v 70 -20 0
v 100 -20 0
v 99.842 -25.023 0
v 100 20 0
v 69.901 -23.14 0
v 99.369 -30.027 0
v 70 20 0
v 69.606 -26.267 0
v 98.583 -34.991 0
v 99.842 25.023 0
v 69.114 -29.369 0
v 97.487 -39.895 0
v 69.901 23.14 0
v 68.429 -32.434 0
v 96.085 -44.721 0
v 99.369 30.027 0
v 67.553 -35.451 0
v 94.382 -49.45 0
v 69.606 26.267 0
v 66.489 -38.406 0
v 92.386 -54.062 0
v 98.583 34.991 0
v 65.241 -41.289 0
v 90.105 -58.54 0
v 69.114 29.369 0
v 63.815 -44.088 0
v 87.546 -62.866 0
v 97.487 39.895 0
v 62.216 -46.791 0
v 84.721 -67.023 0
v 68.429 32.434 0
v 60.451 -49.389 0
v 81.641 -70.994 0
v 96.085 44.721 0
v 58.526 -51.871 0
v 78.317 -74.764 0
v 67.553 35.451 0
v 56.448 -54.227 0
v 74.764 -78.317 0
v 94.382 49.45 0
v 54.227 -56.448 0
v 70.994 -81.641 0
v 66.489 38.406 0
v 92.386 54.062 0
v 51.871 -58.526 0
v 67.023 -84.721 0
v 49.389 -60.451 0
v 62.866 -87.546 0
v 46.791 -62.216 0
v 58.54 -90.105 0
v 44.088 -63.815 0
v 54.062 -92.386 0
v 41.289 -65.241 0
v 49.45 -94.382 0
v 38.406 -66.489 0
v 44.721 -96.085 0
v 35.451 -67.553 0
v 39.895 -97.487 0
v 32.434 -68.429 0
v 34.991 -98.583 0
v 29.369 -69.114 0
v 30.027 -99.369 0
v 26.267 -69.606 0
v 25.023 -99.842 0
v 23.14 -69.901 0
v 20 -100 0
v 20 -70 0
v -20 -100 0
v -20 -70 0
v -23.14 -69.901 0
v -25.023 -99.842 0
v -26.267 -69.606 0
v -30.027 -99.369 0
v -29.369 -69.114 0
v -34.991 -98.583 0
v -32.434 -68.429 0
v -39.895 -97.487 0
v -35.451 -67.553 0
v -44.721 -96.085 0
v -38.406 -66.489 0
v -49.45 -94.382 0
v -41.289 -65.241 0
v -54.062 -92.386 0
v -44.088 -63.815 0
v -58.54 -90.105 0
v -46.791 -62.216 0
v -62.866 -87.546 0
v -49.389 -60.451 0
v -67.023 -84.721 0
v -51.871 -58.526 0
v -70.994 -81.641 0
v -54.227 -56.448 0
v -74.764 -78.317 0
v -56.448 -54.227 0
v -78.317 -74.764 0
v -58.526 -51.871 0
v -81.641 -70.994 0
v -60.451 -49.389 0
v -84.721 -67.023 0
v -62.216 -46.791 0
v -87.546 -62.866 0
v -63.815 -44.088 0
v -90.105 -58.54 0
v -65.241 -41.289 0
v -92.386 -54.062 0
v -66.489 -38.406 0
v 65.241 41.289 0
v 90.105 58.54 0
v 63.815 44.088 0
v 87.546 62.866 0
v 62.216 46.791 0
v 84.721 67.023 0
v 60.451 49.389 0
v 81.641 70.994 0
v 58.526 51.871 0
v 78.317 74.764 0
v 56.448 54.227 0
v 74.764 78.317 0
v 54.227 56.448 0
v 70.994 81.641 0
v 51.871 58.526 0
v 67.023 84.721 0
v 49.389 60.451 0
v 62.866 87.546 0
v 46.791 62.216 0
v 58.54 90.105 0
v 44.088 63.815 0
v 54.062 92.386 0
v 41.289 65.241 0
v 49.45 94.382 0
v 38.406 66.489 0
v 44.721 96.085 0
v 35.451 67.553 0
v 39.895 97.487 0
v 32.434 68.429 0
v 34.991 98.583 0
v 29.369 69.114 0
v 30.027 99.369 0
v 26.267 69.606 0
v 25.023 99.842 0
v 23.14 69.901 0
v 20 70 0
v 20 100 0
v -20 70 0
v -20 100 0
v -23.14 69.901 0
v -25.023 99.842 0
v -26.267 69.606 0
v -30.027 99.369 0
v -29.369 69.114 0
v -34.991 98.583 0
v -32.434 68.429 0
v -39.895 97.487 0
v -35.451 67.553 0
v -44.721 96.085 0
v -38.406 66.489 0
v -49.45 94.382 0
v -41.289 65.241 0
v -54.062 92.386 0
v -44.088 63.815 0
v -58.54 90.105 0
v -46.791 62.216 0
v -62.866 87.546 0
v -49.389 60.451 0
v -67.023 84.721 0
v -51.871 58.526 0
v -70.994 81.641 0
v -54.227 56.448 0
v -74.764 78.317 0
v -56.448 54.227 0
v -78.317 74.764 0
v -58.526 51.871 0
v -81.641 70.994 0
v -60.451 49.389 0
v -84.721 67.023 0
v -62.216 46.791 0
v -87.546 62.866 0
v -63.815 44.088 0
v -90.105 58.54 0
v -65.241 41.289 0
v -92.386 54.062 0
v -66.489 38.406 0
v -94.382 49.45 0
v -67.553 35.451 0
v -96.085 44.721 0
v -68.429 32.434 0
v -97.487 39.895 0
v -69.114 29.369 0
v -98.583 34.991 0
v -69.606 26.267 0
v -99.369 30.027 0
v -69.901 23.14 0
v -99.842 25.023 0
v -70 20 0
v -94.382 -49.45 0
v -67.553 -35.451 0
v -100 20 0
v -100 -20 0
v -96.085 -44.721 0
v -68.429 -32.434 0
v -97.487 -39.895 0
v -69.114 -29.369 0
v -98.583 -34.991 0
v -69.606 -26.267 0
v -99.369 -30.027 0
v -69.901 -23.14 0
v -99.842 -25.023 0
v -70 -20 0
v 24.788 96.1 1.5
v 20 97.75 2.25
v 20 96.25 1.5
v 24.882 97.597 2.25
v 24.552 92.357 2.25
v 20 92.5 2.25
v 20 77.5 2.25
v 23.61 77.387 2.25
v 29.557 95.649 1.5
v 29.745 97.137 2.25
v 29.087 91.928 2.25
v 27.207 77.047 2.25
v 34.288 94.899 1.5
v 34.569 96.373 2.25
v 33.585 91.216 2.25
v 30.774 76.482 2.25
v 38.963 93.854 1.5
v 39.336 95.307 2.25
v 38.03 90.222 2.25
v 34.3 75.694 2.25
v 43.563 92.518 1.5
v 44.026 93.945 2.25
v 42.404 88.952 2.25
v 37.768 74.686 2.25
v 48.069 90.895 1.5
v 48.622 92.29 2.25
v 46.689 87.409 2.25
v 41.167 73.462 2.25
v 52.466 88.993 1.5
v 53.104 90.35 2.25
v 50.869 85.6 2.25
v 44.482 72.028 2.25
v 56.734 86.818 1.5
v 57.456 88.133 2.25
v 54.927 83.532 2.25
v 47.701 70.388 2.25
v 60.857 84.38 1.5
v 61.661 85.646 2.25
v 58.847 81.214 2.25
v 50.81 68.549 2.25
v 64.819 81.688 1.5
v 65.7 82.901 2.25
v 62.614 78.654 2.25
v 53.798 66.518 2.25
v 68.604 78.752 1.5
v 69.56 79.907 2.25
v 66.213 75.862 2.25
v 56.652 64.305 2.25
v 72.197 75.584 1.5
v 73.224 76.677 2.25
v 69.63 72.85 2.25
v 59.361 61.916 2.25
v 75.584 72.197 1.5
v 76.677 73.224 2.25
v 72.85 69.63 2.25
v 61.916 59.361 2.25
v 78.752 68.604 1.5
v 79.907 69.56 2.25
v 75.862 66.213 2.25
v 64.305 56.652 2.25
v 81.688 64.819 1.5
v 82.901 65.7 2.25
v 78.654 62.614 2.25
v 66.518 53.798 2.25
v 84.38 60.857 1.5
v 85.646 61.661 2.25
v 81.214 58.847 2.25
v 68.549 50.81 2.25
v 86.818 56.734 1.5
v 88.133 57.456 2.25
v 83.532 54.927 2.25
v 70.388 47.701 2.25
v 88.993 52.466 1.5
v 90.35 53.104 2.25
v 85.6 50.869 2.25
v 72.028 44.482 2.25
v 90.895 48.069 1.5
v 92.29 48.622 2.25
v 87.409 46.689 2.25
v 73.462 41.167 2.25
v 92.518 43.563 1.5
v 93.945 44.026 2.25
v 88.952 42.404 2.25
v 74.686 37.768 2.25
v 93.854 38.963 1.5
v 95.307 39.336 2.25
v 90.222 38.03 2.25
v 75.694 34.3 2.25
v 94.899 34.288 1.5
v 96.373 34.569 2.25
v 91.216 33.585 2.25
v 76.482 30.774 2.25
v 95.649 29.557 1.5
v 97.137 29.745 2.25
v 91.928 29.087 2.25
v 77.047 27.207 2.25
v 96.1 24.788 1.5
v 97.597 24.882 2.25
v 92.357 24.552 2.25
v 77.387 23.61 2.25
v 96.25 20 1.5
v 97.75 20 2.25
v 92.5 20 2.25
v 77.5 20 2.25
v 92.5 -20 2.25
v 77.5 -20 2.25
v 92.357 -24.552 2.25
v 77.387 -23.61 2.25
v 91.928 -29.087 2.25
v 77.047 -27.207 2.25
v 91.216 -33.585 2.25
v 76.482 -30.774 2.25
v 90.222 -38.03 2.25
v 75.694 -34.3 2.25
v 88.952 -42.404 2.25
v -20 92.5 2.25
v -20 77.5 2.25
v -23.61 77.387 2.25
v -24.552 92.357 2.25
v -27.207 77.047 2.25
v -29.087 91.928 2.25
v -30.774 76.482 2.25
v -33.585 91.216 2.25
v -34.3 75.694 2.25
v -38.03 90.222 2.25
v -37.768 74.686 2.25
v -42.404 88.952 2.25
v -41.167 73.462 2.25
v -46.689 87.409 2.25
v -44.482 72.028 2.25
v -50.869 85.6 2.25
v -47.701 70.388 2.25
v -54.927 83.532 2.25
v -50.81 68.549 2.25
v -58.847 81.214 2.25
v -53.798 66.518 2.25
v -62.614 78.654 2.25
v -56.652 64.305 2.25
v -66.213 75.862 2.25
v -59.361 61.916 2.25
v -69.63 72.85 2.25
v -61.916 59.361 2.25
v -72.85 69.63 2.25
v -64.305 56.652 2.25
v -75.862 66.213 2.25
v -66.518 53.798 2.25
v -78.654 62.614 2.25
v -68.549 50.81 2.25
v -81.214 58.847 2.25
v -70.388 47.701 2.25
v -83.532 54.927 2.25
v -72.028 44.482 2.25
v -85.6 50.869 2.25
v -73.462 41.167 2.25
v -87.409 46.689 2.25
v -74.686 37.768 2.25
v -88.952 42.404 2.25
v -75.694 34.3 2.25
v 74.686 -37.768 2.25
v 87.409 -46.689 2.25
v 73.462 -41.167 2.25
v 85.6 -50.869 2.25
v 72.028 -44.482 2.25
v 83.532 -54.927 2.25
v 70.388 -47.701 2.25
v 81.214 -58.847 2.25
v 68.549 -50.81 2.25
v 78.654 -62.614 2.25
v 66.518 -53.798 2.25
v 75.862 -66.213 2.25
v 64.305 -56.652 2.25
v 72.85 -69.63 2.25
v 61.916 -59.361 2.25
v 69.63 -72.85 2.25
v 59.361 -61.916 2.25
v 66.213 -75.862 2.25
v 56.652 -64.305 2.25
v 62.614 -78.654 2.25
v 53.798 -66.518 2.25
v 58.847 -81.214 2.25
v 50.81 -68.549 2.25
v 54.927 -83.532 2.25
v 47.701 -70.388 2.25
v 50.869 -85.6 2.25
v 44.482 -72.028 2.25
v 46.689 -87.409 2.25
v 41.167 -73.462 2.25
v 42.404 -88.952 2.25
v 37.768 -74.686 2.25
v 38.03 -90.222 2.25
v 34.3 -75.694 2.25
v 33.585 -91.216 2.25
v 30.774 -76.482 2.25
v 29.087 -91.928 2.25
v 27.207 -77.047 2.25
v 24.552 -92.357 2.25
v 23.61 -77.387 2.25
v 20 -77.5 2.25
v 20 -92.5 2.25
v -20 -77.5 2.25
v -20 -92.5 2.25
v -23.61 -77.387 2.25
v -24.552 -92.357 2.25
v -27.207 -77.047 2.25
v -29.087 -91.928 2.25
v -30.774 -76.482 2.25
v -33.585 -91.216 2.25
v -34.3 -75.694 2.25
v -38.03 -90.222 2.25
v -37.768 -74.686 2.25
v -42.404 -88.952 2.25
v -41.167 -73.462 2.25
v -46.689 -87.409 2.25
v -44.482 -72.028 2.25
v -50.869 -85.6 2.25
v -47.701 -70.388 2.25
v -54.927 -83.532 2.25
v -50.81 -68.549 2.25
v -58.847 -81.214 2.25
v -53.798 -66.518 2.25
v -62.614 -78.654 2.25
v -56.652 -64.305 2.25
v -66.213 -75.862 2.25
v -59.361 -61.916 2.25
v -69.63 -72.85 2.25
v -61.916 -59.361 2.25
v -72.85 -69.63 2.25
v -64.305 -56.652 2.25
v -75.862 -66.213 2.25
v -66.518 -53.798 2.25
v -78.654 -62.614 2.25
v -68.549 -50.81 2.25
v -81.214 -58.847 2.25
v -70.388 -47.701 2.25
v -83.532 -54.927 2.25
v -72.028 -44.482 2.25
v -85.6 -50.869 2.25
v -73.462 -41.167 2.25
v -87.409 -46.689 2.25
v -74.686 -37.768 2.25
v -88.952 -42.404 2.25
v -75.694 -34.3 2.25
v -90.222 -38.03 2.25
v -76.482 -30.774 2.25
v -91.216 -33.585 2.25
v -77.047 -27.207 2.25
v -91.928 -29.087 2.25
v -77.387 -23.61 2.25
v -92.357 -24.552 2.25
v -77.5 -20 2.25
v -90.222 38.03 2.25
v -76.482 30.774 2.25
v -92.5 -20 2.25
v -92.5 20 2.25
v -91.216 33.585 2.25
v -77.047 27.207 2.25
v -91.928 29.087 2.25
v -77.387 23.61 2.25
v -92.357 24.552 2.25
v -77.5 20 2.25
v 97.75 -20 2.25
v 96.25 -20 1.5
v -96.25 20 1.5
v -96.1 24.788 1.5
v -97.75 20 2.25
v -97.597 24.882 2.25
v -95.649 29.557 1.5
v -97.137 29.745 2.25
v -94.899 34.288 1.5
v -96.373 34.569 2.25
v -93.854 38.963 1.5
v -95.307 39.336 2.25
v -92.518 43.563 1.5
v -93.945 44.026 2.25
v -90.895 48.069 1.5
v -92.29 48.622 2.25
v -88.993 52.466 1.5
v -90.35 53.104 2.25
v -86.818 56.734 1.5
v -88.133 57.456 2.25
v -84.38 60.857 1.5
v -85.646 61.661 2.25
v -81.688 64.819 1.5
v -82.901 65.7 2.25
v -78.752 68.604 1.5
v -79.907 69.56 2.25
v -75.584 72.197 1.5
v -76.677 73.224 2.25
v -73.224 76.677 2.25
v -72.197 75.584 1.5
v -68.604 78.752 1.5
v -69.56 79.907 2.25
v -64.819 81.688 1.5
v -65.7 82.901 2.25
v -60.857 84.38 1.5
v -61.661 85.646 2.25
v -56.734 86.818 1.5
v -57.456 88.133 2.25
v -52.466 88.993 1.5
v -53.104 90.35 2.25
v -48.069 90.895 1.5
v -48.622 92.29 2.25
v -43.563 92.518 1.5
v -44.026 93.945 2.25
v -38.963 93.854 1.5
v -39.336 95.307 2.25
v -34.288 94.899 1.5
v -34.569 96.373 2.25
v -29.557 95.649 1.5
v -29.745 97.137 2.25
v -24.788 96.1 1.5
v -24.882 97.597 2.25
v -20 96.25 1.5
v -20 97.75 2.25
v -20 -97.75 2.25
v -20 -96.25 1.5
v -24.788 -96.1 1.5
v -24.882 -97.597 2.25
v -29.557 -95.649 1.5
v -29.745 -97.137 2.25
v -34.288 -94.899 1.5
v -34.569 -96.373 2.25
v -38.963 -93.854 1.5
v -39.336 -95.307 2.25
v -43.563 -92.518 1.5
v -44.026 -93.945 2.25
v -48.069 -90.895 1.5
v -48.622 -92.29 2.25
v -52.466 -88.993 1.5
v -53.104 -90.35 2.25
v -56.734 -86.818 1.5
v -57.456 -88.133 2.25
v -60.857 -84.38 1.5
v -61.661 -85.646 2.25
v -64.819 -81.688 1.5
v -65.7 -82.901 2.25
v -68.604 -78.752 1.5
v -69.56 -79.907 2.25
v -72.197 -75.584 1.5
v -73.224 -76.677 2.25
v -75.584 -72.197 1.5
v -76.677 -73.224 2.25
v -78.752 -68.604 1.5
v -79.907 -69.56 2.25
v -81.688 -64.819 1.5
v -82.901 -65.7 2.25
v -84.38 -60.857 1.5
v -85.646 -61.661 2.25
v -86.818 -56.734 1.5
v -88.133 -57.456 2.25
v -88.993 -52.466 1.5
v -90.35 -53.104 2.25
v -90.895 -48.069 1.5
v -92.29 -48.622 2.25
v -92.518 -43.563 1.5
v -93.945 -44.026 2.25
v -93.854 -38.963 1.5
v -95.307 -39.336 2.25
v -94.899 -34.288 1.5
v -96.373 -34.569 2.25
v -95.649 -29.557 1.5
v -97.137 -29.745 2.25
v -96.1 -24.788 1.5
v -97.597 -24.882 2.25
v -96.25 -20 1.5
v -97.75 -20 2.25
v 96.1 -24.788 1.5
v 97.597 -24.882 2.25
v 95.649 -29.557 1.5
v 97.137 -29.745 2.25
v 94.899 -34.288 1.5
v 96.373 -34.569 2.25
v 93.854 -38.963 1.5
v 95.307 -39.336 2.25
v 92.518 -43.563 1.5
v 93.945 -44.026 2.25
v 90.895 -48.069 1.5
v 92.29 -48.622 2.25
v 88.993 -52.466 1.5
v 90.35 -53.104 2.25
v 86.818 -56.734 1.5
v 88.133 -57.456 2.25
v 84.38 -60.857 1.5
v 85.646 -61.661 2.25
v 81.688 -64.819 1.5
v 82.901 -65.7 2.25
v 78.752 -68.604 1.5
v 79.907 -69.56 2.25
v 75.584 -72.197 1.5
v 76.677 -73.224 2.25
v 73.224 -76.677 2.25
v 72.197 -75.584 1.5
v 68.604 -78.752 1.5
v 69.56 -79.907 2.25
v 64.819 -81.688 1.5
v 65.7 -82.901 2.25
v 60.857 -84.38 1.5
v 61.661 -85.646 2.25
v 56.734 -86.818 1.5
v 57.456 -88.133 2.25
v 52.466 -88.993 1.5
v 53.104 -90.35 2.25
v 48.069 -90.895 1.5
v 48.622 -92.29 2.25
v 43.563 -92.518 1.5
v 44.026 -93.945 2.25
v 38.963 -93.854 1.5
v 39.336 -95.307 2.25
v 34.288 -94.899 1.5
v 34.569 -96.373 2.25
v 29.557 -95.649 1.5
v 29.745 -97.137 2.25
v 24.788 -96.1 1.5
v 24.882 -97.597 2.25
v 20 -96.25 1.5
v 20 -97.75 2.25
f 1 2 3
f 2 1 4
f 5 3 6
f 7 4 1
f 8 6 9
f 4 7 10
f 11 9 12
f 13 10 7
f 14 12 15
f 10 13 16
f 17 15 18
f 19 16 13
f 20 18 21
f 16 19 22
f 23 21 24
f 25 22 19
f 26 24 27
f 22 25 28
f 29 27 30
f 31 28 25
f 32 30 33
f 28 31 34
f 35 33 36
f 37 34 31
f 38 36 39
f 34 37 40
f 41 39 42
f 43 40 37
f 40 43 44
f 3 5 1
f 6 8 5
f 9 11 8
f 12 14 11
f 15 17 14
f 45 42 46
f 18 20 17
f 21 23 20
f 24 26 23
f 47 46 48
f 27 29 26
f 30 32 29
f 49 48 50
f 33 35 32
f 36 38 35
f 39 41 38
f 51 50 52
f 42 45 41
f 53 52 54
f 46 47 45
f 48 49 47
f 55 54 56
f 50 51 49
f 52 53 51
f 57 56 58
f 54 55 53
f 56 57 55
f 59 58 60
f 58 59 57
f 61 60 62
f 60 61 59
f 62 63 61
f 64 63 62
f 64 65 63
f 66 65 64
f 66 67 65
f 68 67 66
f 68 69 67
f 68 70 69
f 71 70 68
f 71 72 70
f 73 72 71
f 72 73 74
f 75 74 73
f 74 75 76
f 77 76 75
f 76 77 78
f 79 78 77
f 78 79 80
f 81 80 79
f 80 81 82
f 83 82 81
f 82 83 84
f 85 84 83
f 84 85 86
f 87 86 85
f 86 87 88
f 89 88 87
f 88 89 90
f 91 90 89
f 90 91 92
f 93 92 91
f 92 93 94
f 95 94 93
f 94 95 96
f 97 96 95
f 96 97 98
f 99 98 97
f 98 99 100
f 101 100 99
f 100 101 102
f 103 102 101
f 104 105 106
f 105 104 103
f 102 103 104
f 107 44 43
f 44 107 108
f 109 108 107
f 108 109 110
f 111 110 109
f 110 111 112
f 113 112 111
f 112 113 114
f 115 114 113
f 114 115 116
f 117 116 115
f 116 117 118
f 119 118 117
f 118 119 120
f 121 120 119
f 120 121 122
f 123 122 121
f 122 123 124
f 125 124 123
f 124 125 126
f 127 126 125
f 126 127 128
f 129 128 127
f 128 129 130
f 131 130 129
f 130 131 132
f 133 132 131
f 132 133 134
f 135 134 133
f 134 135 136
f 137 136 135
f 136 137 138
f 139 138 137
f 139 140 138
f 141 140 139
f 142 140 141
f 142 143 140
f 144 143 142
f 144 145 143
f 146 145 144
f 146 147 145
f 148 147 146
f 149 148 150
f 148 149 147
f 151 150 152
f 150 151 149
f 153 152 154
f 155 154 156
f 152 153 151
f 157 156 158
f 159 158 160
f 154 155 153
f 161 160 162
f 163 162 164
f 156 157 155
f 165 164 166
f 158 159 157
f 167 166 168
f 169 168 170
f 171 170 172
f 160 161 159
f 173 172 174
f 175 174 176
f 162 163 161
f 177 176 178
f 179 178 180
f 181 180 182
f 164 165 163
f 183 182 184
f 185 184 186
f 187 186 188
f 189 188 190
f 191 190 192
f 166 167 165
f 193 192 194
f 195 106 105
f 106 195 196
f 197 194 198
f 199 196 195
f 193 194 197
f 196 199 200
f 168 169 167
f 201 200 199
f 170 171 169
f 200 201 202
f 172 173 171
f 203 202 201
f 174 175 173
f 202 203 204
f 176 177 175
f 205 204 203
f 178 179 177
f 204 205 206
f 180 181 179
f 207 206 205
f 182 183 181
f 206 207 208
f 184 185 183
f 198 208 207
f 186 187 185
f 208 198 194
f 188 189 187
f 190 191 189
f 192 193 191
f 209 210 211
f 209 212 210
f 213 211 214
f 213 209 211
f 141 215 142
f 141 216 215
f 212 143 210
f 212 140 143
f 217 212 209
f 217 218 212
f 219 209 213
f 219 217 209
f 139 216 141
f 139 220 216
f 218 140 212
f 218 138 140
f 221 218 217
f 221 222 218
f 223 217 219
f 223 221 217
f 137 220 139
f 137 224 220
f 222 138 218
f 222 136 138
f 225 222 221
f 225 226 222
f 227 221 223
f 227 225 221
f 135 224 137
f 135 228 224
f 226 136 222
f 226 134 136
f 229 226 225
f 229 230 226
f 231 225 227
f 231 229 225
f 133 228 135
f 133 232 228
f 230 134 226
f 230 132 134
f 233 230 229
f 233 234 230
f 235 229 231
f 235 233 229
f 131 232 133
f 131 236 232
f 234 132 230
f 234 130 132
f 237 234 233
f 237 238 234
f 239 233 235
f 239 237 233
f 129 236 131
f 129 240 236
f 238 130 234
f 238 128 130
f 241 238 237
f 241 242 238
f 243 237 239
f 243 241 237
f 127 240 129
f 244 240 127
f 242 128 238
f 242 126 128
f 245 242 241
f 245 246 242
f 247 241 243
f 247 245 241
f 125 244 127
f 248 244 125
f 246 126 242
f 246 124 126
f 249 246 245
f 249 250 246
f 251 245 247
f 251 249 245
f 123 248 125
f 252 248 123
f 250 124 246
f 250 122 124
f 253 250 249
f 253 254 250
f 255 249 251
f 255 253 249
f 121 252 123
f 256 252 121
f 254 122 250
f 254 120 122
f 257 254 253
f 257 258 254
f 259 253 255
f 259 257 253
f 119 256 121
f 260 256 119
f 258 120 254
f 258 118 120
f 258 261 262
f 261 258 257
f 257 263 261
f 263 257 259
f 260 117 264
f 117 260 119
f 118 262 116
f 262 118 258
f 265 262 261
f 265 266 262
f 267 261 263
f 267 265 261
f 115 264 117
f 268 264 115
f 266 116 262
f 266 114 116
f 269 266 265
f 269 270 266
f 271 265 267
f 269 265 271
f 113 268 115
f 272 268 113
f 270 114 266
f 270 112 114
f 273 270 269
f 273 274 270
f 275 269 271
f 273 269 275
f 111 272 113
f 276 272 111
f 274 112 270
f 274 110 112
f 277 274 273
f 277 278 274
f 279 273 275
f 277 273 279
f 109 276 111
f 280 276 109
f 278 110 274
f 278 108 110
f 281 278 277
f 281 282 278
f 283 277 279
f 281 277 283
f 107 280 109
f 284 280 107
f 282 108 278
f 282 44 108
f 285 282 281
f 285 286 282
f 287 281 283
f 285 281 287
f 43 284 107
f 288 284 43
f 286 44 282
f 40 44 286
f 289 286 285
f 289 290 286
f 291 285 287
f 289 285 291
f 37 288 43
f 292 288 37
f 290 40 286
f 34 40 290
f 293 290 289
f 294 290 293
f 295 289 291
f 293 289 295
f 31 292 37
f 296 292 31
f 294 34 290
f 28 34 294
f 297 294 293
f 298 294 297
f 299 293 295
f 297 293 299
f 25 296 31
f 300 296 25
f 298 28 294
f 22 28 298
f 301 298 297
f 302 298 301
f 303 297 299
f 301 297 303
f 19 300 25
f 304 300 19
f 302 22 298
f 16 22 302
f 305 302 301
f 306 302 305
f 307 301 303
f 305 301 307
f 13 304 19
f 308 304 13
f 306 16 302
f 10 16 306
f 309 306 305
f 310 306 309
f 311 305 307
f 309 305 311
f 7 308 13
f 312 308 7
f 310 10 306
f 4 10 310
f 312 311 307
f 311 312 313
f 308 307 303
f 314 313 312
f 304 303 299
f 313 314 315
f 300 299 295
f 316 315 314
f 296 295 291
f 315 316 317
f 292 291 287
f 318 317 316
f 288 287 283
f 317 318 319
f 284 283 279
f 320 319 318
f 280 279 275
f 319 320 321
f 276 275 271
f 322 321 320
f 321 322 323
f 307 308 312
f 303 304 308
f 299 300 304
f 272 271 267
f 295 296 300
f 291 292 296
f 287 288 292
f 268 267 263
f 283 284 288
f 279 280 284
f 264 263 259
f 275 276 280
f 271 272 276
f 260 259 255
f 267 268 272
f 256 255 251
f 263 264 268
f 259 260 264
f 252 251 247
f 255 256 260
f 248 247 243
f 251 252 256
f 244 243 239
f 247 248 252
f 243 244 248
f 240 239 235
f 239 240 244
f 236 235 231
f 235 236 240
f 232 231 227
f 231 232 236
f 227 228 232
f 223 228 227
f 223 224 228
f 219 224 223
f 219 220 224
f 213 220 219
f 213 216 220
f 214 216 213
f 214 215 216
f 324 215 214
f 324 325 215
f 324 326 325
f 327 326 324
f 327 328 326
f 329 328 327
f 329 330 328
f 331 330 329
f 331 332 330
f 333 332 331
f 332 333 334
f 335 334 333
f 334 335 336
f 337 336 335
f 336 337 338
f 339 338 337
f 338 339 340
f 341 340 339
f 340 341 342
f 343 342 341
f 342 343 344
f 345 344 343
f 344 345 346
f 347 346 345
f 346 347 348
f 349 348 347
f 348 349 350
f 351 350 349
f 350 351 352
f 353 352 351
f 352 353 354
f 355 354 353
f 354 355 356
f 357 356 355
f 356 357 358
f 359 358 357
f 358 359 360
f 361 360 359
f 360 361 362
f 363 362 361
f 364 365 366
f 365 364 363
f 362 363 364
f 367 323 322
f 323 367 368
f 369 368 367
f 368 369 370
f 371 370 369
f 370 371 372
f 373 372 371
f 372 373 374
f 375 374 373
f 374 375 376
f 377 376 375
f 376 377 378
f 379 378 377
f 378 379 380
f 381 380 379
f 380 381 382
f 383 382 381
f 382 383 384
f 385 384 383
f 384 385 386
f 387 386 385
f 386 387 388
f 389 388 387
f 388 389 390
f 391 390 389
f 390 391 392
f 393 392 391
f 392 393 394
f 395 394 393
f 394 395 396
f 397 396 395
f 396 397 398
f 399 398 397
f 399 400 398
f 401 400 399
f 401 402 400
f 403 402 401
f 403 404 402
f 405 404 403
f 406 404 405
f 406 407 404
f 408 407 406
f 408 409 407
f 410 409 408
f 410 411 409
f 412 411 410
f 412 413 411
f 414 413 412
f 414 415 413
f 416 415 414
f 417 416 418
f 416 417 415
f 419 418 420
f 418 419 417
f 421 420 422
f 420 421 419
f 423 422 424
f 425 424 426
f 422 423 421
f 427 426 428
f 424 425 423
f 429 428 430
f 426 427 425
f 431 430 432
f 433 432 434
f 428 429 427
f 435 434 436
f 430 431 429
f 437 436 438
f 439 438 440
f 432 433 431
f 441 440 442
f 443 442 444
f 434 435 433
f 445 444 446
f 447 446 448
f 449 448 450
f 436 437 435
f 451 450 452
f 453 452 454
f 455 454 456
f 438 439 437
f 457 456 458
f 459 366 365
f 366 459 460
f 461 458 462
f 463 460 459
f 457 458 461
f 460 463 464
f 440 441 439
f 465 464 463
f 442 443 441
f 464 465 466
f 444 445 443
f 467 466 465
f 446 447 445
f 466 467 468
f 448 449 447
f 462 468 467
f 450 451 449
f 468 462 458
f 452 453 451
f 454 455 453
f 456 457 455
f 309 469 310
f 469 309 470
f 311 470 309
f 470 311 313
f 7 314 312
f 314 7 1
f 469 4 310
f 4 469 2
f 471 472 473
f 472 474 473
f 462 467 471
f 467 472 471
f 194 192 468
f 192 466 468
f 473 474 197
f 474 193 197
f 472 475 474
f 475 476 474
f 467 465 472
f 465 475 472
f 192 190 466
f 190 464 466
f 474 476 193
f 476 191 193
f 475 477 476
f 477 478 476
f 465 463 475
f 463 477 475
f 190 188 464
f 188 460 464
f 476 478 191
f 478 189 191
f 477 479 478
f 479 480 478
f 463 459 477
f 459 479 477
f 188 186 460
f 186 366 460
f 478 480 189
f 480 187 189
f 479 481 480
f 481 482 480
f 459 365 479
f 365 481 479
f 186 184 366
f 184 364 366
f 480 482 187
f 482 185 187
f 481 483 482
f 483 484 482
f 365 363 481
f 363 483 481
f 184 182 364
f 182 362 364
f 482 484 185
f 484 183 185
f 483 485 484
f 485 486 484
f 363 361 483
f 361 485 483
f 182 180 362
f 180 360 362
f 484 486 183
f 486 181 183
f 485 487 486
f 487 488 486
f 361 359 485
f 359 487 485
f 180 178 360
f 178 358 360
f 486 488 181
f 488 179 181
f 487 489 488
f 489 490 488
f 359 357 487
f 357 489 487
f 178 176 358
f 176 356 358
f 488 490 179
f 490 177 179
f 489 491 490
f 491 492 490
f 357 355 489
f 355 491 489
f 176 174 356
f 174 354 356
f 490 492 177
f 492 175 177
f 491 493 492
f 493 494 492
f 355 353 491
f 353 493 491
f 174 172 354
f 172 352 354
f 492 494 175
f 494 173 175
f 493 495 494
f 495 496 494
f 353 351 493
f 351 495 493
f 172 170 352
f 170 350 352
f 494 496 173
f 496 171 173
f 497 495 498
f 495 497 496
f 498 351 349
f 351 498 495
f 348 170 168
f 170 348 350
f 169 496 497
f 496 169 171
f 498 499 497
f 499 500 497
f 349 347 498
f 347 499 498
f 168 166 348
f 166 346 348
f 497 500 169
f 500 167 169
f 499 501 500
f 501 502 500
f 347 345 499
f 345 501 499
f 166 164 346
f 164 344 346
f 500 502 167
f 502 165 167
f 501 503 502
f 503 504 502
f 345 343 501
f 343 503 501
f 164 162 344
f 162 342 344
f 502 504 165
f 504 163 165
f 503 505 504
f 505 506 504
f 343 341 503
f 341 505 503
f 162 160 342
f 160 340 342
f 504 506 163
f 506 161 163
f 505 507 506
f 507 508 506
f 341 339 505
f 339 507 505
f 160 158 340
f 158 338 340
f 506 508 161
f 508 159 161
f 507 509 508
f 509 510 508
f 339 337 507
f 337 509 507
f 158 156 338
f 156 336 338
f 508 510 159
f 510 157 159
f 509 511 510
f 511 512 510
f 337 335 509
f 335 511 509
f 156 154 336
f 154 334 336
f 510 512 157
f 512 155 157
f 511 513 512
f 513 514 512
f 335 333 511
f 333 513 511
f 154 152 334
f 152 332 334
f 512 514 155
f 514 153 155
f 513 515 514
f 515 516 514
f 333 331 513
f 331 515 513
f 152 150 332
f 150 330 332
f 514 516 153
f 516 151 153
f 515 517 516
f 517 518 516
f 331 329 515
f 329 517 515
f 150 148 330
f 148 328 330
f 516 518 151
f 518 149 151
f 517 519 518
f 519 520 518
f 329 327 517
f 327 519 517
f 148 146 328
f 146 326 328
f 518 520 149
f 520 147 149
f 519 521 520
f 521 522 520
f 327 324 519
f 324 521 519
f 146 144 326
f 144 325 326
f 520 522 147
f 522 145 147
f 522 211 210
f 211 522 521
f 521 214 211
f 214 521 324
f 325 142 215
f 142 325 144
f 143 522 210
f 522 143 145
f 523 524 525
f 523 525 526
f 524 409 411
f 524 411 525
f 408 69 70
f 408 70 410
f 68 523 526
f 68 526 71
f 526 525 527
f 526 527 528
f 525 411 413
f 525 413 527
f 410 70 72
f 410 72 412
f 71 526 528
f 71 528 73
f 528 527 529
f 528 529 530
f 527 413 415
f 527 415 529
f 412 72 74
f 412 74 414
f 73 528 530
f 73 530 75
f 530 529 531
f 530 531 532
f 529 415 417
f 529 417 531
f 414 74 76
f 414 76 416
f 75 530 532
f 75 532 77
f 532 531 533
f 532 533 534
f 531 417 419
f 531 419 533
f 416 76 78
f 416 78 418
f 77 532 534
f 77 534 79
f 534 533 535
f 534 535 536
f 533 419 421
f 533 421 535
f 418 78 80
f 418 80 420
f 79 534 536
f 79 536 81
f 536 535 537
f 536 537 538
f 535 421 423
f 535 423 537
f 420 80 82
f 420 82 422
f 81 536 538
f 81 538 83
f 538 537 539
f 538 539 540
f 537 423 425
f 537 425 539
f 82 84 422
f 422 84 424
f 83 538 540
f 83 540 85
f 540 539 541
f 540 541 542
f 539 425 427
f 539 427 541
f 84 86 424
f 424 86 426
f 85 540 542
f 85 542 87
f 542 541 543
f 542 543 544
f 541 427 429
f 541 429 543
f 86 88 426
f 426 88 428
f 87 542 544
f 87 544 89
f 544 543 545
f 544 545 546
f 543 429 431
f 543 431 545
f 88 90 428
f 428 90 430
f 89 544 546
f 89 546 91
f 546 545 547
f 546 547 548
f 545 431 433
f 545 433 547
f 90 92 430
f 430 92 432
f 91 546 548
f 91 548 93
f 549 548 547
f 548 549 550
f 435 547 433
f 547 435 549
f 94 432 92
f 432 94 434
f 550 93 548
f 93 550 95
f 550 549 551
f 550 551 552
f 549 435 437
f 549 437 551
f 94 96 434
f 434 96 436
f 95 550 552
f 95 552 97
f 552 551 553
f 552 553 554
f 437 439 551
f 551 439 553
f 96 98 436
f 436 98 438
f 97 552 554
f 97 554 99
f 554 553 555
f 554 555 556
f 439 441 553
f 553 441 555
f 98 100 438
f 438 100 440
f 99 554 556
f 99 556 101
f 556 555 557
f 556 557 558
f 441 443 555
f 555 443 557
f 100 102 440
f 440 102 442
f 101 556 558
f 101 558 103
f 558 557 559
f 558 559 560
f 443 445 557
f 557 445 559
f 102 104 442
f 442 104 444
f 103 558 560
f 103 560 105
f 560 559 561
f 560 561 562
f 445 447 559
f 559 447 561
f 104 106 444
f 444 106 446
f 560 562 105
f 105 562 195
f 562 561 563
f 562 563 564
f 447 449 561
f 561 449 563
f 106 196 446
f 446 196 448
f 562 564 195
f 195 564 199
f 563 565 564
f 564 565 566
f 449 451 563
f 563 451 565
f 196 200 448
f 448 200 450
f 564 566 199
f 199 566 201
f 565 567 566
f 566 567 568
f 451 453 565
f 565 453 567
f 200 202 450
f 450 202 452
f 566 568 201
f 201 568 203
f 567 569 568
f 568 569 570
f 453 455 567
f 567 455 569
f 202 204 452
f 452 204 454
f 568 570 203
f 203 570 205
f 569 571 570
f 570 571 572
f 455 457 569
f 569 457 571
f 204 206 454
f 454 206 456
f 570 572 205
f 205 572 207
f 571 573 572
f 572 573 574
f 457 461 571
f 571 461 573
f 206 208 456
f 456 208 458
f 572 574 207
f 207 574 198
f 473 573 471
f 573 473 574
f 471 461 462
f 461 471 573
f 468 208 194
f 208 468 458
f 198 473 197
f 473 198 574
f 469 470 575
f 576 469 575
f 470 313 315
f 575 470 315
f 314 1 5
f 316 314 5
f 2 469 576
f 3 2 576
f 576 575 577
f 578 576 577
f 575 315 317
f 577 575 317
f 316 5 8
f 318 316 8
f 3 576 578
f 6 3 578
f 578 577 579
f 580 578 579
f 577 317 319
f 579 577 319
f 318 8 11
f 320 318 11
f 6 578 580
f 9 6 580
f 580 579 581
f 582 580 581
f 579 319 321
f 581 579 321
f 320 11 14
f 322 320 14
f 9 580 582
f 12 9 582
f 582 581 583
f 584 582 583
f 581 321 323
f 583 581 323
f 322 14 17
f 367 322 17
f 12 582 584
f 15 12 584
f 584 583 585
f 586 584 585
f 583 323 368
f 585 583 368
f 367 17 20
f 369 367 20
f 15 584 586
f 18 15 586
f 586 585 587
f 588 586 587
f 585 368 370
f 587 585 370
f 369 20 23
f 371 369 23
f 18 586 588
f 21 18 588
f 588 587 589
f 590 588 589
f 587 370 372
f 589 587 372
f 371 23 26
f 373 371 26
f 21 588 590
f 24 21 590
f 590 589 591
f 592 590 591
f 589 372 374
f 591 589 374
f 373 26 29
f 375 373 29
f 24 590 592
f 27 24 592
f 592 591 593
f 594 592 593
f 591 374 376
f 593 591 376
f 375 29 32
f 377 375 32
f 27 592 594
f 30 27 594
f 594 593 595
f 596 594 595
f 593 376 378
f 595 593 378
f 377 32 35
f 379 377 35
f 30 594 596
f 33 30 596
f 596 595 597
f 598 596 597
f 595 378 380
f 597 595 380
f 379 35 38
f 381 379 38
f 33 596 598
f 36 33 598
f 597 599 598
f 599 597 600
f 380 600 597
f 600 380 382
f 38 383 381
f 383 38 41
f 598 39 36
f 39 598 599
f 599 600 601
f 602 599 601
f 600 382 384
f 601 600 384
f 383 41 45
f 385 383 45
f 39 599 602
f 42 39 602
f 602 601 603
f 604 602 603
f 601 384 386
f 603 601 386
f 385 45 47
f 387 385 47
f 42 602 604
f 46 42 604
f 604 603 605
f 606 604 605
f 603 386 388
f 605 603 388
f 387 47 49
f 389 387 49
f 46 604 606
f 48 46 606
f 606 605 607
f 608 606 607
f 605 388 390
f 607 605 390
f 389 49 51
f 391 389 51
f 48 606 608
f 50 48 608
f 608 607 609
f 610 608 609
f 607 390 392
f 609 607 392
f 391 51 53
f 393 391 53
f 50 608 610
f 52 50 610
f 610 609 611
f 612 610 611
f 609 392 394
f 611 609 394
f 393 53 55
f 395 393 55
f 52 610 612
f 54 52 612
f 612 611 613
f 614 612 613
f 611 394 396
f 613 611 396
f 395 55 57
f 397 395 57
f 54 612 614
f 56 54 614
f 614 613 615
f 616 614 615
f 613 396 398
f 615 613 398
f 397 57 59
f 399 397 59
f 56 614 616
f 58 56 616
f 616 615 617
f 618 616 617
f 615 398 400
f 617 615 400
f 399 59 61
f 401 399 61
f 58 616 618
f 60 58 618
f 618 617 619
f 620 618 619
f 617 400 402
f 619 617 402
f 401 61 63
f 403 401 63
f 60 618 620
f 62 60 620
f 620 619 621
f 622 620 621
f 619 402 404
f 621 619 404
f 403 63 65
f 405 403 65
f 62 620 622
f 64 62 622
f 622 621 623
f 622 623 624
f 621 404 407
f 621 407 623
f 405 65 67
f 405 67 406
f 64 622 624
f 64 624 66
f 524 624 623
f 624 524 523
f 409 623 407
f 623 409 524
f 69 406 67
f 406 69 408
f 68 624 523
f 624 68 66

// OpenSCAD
// Radius of the ring (half of the print bad size)
size = 100; // [50:400]

// Size of the rounded corner, higher is more rouned.You get a circle if = [size], you get a square with rounded corners if = [ring_width]
corner_size = 80; // [10:400]

// Width of the ring
ring_width = 30; // [10:100]

/* [Hidden] */

$fn=100;

for (i = [0:3]){
    rotate([0,0,90*i])
    arm();
}

module arm() {
    translate([size,size-corner_size,0])
    rotate([90,0,0])
    linear_extrude((size - corner_size)*2) profile();

    translate([size-corner_size,size-corner_size,0])
    intersection(){
        cube(corner_size);
        rotate_extrude()
        translate([corner_size,0,0]) profile();
    }
}


module profile() {
    scale(ring_width/40)
    translate([-40,0,0])
    polygon([[0,0],[40,0],[37,3],[35,2],[30,3],[10,3]]);
}
